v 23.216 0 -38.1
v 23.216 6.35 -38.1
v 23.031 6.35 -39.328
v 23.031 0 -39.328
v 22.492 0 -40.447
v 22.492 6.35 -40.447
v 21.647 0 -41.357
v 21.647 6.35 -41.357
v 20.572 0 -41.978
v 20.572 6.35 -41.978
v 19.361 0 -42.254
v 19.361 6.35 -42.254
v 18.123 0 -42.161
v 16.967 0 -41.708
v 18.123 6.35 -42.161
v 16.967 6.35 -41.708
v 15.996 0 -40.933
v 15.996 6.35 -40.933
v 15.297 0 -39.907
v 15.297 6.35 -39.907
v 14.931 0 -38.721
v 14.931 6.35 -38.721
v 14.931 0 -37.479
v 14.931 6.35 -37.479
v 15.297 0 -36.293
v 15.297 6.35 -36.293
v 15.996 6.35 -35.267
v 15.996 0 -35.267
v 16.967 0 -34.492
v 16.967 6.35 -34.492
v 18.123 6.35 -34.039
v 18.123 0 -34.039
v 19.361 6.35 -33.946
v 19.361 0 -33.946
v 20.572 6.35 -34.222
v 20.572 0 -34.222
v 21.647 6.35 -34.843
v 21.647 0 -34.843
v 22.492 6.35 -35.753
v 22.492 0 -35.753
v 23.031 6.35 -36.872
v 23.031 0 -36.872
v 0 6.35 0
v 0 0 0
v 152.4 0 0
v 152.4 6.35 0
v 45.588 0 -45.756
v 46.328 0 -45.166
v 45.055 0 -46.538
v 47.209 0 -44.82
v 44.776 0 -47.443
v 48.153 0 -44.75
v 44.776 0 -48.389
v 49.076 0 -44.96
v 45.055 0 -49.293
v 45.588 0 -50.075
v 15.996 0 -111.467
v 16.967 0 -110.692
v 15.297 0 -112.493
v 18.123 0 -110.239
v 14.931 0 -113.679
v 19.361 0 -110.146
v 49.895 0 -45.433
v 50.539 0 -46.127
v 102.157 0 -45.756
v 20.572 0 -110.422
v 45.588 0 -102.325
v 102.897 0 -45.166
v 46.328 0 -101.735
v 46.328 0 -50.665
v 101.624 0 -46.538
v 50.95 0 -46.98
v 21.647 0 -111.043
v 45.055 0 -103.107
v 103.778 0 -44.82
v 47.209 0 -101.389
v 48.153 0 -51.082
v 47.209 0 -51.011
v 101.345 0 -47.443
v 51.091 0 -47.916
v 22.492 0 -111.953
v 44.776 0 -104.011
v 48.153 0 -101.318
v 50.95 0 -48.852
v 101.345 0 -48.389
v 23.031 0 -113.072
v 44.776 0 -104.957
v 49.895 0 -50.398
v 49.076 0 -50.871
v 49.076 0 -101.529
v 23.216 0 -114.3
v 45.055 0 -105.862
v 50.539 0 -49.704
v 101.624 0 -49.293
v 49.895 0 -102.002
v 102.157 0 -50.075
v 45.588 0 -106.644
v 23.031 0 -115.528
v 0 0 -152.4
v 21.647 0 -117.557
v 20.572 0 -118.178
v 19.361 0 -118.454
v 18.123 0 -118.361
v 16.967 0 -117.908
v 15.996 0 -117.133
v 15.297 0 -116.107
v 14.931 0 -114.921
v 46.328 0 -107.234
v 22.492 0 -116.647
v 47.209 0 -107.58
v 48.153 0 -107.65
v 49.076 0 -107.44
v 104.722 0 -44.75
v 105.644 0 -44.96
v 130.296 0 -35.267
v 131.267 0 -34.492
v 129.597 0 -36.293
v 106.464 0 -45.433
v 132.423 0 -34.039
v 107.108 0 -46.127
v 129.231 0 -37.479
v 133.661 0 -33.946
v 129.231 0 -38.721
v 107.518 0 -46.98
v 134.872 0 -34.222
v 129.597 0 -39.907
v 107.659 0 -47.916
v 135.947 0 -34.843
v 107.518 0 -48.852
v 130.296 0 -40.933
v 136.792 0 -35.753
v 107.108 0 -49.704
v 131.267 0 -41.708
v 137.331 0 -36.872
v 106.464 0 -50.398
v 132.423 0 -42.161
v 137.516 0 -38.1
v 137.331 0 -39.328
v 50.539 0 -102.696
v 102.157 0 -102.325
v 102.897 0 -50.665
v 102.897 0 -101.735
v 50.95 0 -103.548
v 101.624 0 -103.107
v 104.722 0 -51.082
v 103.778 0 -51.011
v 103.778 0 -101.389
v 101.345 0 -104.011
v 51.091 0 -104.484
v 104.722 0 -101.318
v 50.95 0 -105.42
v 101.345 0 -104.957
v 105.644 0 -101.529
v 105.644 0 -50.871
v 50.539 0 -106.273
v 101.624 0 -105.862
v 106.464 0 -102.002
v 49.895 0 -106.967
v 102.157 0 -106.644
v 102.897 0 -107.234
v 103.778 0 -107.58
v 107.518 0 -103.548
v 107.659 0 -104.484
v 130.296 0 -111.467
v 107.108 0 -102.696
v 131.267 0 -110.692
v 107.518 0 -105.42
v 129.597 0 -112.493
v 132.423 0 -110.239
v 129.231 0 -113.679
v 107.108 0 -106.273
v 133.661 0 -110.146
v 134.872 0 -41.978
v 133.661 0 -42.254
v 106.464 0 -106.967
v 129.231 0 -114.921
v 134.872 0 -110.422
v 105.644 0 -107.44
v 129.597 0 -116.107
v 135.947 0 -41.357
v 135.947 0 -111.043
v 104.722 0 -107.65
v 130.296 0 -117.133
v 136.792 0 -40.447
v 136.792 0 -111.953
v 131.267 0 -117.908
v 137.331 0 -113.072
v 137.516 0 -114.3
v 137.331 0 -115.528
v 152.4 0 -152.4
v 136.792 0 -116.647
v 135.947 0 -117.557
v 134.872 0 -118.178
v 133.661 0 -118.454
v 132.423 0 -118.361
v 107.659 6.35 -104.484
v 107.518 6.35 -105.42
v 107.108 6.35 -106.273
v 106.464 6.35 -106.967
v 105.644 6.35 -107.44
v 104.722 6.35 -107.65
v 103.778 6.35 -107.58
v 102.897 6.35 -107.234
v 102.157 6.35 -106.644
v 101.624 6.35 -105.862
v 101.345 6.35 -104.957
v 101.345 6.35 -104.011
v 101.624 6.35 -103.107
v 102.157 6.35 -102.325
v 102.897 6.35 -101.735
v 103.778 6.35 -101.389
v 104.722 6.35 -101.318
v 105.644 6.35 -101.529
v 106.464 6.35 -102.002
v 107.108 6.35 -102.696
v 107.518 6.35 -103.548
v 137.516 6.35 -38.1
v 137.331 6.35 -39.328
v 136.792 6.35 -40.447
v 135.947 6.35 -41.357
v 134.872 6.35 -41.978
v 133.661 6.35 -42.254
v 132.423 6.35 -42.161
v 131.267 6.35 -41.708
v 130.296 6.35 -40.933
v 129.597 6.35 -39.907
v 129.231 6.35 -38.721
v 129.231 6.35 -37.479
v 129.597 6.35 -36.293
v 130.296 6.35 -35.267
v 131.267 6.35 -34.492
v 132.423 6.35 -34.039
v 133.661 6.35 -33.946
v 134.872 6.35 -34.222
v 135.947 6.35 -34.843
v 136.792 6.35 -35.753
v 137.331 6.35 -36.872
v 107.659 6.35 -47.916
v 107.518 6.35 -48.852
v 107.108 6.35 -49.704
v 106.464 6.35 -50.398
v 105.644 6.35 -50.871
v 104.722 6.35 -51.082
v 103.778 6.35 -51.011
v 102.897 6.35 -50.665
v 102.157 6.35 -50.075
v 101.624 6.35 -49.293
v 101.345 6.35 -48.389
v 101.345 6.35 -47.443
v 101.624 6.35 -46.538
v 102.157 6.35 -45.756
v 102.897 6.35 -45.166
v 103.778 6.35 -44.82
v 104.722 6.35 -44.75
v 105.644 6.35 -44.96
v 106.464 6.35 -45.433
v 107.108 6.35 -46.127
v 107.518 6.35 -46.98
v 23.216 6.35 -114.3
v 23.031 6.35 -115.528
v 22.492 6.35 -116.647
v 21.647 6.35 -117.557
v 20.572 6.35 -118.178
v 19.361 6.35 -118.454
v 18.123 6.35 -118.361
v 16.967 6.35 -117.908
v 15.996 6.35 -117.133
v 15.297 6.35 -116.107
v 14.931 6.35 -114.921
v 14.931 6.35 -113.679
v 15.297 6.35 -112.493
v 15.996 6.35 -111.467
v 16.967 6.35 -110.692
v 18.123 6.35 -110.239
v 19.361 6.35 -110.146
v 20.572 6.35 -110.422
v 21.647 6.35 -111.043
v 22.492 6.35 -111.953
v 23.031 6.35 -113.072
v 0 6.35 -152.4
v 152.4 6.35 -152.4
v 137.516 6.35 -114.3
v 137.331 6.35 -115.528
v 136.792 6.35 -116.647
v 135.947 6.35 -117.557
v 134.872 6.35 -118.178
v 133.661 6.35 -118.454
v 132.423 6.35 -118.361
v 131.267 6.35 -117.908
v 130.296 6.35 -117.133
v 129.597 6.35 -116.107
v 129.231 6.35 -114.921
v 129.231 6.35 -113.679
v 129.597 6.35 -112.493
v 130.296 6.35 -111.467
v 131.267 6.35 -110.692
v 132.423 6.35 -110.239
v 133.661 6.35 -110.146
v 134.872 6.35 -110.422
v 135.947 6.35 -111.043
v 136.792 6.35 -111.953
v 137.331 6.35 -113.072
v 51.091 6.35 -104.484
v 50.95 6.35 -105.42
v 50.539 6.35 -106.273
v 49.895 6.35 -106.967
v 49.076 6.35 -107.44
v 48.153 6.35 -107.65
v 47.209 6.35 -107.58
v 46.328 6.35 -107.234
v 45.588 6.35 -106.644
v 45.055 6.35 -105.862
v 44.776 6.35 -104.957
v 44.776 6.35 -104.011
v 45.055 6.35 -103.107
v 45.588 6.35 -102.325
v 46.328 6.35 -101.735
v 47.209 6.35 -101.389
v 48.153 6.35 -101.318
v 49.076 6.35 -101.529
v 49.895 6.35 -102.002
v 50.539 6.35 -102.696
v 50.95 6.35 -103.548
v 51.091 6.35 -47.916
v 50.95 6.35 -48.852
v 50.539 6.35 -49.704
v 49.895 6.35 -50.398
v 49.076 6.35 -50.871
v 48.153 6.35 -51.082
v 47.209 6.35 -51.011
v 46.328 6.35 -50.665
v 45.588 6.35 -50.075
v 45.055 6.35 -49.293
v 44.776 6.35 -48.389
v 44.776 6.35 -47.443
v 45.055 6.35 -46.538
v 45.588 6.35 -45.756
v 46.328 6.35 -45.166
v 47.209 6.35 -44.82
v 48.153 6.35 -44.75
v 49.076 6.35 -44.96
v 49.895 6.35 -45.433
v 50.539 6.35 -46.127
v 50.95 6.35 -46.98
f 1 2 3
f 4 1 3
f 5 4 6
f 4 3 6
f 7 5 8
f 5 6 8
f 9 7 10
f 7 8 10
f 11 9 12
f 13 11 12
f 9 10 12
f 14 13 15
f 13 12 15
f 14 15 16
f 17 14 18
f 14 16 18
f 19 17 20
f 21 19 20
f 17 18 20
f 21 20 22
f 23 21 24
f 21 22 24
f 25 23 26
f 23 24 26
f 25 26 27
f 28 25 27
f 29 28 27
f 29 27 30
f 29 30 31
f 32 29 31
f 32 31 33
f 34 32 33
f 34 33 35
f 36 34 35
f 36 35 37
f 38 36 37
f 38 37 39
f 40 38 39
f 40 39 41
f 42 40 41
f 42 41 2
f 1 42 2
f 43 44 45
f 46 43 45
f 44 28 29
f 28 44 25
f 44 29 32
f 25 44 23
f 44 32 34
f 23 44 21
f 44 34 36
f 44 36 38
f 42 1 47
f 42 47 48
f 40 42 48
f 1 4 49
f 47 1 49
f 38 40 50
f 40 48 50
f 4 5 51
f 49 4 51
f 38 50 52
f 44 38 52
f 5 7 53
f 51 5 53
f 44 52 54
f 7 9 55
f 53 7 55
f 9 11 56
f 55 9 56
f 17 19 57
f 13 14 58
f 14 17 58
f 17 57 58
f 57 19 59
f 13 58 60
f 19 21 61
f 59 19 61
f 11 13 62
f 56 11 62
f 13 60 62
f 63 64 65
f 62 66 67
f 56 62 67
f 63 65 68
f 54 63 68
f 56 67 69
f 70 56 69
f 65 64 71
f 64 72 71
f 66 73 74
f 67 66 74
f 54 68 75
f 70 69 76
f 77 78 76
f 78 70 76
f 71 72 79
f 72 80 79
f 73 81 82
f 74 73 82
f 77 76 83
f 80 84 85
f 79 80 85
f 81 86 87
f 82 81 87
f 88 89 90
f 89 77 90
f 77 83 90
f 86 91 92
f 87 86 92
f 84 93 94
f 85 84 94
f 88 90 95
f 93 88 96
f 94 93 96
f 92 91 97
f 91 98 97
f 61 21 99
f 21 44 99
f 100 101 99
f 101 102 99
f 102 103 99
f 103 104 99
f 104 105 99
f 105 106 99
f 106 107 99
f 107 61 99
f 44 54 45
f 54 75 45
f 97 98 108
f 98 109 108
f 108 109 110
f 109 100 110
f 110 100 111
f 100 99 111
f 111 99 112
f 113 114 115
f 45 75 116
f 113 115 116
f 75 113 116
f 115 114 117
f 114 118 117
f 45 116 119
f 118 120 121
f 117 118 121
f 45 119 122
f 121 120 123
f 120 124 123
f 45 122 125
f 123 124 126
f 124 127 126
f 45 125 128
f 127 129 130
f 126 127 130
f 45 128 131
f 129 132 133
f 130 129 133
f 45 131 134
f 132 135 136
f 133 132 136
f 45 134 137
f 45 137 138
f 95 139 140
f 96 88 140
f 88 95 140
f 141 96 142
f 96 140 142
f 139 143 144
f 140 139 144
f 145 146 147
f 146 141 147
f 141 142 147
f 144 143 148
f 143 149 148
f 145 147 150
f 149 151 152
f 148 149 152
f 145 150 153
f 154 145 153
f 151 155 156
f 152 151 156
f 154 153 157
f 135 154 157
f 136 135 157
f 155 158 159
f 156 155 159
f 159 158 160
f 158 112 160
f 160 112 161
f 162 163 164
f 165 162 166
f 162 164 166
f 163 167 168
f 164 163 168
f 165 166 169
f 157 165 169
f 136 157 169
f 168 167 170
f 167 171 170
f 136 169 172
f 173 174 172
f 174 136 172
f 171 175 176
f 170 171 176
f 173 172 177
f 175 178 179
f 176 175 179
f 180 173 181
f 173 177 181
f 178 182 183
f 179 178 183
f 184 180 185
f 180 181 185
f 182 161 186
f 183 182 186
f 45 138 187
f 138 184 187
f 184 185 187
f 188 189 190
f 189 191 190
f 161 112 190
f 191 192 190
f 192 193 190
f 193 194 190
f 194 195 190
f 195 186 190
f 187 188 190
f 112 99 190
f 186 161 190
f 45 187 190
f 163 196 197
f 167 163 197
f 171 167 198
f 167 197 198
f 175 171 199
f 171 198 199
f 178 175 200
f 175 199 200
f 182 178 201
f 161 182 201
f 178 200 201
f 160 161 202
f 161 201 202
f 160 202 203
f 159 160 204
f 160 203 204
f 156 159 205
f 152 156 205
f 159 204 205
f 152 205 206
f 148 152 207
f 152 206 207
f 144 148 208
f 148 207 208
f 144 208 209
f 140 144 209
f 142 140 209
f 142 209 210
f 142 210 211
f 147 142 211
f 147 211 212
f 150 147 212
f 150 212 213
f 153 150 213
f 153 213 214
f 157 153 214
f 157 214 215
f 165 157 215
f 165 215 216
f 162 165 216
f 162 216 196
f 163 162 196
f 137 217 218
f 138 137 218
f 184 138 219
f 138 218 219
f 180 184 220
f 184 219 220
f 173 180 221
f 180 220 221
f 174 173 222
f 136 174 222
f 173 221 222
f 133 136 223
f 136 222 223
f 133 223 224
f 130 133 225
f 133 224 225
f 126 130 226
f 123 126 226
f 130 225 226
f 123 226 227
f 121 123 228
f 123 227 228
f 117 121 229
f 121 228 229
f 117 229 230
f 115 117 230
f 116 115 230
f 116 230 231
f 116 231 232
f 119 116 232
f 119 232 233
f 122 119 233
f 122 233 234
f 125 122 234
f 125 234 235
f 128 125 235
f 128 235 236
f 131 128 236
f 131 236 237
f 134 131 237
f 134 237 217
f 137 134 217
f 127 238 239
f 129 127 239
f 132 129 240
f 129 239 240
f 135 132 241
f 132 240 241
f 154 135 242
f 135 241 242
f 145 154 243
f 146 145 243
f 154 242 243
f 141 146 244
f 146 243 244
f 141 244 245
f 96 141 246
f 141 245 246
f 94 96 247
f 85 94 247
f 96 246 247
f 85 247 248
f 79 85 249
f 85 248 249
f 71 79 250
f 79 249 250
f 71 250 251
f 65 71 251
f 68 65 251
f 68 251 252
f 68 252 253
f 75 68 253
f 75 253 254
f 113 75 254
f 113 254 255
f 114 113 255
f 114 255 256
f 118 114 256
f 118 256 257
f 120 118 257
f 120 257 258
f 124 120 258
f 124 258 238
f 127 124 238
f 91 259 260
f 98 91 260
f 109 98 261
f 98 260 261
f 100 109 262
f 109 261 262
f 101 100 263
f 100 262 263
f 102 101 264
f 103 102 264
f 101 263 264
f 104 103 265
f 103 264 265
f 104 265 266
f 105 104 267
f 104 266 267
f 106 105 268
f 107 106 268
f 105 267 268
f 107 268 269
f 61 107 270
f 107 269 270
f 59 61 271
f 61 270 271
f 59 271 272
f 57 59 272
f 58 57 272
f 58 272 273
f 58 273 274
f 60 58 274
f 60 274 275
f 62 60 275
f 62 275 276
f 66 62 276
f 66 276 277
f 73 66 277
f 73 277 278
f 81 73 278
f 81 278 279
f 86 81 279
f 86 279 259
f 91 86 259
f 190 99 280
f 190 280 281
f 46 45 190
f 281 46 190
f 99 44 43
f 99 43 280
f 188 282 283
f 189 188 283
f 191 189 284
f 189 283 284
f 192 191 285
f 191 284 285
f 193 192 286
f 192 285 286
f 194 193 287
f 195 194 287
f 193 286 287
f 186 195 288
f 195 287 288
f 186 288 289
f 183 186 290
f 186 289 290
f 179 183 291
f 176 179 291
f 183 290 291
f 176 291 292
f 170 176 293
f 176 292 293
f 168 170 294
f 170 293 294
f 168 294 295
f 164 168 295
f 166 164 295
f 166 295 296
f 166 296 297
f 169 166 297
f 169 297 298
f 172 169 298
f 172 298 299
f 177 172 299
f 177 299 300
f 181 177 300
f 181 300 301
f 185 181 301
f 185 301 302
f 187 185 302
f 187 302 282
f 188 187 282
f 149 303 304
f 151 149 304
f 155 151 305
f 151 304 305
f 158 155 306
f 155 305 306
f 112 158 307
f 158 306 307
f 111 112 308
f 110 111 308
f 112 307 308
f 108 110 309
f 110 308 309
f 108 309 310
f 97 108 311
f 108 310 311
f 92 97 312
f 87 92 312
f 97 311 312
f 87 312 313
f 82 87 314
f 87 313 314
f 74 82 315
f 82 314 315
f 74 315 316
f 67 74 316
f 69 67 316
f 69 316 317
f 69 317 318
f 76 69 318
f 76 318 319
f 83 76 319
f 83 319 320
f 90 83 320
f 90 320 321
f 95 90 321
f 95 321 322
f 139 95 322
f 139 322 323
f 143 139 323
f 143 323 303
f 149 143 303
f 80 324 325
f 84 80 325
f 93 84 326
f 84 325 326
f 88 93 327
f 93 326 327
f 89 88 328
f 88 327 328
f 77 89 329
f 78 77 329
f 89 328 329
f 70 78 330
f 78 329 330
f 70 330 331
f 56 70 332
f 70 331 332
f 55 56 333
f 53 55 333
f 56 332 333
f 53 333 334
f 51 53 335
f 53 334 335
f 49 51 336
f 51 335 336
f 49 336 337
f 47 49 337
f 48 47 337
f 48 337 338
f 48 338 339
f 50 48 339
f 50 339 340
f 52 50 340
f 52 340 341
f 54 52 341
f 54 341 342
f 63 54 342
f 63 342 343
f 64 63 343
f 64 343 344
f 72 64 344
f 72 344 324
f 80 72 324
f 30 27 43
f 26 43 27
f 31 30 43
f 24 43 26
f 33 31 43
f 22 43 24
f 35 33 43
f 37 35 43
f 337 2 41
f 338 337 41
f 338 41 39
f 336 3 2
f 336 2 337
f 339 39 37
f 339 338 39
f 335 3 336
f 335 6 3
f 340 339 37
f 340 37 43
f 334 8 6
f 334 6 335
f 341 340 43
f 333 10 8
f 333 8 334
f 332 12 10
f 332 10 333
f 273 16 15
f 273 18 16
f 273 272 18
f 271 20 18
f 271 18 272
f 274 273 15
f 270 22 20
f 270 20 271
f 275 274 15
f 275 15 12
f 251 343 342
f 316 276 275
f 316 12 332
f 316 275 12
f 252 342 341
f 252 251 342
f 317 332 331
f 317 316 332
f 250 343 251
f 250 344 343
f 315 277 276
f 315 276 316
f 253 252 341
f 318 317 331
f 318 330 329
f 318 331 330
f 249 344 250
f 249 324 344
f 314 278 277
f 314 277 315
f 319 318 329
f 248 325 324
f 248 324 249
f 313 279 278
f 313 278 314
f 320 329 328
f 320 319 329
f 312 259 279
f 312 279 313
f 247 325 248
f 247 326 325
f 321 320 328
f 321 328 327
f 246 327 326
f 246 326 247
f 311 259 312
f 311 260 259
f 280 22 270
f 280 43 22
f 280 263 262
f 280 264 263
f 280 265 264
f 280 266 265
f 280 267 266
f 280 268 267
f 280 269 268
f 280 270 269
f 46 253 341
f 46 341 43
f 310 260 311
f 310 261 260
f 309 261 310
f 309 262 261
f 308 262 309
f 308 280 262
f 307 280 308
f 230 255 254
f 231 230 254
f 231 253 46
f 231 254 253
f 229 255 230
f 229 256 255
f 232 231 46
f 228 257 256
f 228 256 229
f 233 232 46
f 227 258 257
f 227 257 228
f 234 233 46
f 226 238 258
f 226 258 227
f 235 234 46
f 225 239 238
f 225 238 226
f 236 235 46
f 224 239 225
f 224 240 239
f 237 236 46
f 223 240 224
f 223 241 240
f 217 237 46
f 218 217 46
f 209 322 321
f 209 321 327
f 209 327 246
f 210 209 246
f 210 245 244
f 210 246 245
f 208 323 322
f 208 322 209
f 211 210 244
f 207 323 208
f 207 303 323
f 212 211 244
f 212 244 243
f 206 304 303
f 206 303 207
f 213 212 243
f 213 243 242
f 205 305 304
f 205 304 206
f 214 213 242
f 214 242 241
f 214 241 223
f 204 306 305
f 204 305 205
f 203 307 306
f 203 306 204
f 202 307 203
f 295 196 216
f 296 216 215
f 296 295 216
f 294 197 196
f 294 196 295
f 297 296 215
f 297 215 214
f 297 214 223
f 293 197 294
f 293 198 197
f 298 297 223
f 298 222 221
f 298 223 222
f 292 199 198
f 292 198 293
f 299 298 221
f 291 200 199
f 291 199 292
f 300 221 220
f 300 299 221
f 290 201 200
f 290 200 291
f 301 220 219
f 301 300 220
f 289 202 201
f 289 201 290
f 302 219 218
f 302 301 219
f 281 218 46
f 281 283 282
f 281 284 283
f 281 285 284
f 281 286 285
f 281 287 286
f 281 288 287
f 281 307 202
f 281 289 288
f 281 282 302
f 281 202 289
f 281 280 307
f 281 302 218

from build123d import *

# Parameters (mm, degrees)
SKETCH1_W               = 152.4
SKETCH1_H               = 152.4
BOSS_EXTRUDE1_DEPTH     = 6.35
SKETCH2_R               = 4.1656
SKETCH2_R_2             = 3.175
CUT_EXTRUDE1_DEPTH      = 1
CUT_EXTRUDE1_DEPTH_BACK = 7.35


with BuildPart() as part:
    # Sketch1 → Boss-Extrude1 (new body)
    with BuildSketch(Plane(origin=(0, 0, 0), x_dir=(1, 0, 0), z_dir=(0, 1, 0))):
        with Locations((76.2, 76.2)):
            Rectangle(SKETCH1_W, SKETCH1_H)
    extrude(amount=BOSS_EXTRUDE1_DEPTH)

    # Sketch2 → Cut-Extrude1 (cut, two sides)
    with BuildSketch(Plane(origin=(0, 6.35, 0), x_dir=(1, 0, 0), z_dir=(0, 1, 0))) as cut_extrude1_sk:
        with Locations((19.05, 38.1)):
            Circle(SKETCH2_R)
        with Locations((19.05, 114.3)):
            Circle(SKETCH2_R)
        with Locations((133.35, 114.3)):
            Circle(SKETCH2_R)
        with Locations((133.35, 38.1)):
            Circle(SKETCH2_R)
        with Locations((104.484271247, 104.484271247)):
            Circle(SKETCH2_R_2)
        with Locations((47.915728753, 47.915728753)):
            Circle(SKETCH2_R_2)
        with Locations((47.915728753, 104.484271247)):
            Circle(SKETCH2_R_2)
        with Locations((104.484271247, 47.915728753)):
            Circle(SKETCH2_R_2)
    extrude(amount=CUT_EXTRUDE1_DEPTH, mode=Mode.SUBTRACT)
    extrude(cut_extrude1_sk.sketch, amount=-CUT_EXTRUDE1_DEPTH_BACK, mode=Mode.SUBTRACT)


solid = part.part
